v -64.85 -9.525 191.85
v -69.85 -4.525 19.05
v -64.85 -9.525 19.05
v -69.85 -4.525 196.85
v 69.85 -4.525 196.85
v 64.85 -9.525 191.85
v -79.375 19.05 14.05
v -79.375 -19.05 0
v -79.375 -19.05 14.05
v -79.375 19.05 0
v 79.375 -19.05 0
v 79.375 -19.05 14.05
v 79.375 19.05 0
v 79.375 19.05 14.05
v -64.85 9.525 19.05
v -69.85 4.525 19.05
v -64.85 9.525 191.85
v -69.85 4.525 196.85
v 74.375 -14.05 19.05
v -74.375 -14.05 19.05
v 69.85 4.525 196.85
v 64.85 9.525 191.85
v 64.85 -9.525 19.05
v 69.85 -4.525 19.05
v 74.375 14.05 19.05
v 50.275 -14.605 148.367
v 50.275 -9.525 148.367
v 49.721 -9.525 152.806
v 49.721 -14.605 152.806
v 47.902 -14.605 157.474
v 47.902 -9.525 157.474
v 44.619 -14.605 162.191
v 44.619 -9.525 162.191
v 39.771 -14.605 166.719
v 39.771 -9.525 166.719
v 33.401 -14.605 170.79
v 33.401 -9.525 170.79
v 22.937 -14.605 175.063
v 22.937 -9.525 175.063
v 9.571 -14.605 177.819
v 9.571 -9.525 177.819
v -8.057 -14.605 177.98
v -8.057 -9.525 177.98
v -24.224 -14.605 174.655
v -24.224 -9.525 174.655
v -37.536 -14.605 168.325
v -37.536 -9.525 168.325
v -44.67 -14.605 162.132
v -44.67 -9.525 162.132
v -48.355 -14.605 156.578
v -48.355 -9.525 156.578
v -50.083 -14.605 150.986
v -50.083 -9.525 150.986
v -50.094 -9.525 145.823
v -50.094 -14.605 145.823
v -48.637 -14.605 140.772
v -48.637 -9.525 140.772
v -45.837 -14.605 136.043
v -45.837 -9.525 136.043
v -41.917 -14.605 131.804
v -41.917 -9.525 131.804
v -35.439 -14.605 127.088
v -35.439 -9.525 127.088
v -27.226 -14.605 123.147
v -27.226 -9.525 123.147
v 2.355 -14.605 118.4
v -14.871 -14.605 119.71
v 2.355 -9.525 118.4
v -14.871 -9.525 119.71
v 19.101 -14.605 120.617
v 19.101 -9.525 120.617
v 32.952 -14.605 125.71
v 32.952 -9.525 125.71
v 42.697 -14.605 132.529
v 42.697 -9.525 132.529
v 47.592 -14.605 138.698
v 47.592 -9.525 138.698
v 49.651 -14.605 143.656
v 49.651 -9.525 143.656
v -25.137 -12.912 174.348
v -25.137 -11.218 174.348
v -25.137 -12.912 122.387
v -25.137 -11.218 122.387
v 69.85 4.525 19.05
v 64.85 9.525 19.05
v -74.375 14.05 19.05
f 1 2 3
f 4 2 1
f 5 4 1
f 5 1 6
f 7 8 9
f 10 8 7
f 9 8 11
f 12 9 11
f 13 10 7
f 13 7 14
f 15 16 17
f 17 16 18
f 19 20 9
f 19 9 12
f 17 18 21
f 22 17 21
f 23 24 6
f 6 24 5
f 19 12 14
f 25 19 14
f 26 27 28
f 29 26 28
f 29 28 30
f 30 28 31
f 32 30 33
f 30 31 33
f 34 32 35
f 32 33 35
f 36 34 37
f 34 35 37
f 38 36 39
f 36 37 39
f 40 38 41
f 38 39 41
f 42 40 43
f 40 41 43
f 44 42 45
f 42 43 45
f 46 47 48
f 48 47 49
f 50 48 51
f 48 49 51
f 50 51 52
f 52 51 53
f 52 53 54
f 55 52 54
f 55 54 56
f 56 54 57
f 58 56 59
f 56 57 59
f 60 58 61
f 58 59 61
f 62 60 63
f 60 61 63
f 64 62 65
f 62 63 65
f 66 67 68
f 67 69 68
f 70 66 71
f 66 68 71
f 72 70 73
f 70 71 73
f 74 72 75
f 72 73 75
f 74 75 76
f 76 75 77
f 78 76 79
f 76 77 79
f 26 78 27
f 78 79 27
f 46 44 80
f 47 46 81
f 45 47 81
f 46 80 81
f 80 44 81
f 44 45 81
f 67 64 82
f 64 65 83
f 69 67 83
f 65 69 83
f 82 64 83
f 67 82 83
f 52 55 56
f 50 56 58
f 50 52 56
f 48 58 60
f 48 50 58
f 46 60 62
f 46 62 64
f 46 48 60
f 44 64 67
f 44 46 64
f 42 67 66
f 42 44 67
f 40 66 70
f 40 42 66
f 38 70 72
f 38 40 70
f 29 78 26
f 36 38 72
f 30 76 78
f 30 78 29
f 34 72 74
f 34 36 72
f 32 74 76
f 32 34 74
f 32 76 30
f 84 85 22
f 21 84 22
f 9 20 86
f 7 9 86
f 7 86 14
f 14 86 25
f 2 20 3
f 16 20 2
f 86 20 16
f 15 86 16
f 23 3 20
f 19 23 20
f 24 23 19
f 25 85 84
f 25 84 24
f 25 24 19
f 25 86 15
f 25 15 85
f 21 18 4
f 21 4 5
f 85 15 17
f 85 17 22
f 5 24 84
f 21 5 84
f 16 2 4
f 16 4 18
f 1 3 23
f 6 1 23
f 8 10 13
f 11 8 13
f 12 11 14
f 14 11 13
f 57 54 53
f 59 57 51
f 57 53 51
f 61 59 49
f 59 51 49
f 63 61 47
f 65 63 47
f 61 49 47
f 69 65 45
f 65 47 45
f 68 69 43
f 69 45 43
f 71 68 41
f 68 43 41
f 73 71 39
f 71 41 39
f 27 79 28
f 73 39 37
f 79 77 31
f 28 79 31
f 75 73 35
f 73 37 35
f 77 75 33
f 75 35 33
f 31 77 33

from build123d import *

# Parameters (mm, degrees)
F0_W     = 158.75
F0_H     = 38.1
F1_DEPTH = 19.05
F2_W     = 139.7
F2_H     = 19.05
F3_DEPTH = 177.8
F4_SIZE  = 5
F6_DEPTH = 5.08


with BuildPart() as f1:
    # F0 (on Top) → F1 (new body)
    with BuildSketch(Plane.XY):
        Rectangle(F0_W, F0_H)
    extrude(amount=F1_DEPTH)

    # F2 (on face) → F3 (join)
    with BuildSketch(Plane.XY.offset(19.05)):
        Rectangle(F2_W, F2_H)
    extrude(amount=F3_DEPTH)

    # F4
    f4_edges = [f1.edges().sort_by_distance(p)[0] for p in [
        (0, -19.05, 19.05),
        (-79.375, 0, 19.05),
        (79.375, 0, 19.05),
        (0, 19.05, 19.05),
        (-69.85, -9.525, 107.95),
        (-69.85, 9.525, 107.95),
        (0, -9.525, 196.85),
        (0, 9.525, 196.85),
        (69.85, -9.525, 107.95),
        (69.85, 9.525, 107.95),
    ]]
    chamfer(f4_edges, length=F4_SIZE)


with BuildPart() as f6:
    # F5 (on face) → F6 (new body)
    with BuildSketch(Plane.XZ.offset(9.525)):
        with BuildLine():
            add(Edge.make_bspline(
                [(50.2747856081, 148.3674943447), (50.2747856081, 200.3290185718), (-25.137392804, 174.3482564582), (-100.5495712161, 148.3674943447), (-25.137392804, 122.3867322312), (50.2747856081, 96.4059701176), (50.2747856081, 148.3674943447)],
                knots=[0, 0, 0, 2.0943951024, 2.0943951024, 4.1887902048, 4.1887902048, 6.2831853072, 6.2831853072, 6.2831853072], degree=2, weights=[1, 0.5, 1, 0.5, 1, 0.5, 1]))
        make_face()
    extrude(amount=F6_DEPTH)


solid = Compound([f1.part, f6.part])
